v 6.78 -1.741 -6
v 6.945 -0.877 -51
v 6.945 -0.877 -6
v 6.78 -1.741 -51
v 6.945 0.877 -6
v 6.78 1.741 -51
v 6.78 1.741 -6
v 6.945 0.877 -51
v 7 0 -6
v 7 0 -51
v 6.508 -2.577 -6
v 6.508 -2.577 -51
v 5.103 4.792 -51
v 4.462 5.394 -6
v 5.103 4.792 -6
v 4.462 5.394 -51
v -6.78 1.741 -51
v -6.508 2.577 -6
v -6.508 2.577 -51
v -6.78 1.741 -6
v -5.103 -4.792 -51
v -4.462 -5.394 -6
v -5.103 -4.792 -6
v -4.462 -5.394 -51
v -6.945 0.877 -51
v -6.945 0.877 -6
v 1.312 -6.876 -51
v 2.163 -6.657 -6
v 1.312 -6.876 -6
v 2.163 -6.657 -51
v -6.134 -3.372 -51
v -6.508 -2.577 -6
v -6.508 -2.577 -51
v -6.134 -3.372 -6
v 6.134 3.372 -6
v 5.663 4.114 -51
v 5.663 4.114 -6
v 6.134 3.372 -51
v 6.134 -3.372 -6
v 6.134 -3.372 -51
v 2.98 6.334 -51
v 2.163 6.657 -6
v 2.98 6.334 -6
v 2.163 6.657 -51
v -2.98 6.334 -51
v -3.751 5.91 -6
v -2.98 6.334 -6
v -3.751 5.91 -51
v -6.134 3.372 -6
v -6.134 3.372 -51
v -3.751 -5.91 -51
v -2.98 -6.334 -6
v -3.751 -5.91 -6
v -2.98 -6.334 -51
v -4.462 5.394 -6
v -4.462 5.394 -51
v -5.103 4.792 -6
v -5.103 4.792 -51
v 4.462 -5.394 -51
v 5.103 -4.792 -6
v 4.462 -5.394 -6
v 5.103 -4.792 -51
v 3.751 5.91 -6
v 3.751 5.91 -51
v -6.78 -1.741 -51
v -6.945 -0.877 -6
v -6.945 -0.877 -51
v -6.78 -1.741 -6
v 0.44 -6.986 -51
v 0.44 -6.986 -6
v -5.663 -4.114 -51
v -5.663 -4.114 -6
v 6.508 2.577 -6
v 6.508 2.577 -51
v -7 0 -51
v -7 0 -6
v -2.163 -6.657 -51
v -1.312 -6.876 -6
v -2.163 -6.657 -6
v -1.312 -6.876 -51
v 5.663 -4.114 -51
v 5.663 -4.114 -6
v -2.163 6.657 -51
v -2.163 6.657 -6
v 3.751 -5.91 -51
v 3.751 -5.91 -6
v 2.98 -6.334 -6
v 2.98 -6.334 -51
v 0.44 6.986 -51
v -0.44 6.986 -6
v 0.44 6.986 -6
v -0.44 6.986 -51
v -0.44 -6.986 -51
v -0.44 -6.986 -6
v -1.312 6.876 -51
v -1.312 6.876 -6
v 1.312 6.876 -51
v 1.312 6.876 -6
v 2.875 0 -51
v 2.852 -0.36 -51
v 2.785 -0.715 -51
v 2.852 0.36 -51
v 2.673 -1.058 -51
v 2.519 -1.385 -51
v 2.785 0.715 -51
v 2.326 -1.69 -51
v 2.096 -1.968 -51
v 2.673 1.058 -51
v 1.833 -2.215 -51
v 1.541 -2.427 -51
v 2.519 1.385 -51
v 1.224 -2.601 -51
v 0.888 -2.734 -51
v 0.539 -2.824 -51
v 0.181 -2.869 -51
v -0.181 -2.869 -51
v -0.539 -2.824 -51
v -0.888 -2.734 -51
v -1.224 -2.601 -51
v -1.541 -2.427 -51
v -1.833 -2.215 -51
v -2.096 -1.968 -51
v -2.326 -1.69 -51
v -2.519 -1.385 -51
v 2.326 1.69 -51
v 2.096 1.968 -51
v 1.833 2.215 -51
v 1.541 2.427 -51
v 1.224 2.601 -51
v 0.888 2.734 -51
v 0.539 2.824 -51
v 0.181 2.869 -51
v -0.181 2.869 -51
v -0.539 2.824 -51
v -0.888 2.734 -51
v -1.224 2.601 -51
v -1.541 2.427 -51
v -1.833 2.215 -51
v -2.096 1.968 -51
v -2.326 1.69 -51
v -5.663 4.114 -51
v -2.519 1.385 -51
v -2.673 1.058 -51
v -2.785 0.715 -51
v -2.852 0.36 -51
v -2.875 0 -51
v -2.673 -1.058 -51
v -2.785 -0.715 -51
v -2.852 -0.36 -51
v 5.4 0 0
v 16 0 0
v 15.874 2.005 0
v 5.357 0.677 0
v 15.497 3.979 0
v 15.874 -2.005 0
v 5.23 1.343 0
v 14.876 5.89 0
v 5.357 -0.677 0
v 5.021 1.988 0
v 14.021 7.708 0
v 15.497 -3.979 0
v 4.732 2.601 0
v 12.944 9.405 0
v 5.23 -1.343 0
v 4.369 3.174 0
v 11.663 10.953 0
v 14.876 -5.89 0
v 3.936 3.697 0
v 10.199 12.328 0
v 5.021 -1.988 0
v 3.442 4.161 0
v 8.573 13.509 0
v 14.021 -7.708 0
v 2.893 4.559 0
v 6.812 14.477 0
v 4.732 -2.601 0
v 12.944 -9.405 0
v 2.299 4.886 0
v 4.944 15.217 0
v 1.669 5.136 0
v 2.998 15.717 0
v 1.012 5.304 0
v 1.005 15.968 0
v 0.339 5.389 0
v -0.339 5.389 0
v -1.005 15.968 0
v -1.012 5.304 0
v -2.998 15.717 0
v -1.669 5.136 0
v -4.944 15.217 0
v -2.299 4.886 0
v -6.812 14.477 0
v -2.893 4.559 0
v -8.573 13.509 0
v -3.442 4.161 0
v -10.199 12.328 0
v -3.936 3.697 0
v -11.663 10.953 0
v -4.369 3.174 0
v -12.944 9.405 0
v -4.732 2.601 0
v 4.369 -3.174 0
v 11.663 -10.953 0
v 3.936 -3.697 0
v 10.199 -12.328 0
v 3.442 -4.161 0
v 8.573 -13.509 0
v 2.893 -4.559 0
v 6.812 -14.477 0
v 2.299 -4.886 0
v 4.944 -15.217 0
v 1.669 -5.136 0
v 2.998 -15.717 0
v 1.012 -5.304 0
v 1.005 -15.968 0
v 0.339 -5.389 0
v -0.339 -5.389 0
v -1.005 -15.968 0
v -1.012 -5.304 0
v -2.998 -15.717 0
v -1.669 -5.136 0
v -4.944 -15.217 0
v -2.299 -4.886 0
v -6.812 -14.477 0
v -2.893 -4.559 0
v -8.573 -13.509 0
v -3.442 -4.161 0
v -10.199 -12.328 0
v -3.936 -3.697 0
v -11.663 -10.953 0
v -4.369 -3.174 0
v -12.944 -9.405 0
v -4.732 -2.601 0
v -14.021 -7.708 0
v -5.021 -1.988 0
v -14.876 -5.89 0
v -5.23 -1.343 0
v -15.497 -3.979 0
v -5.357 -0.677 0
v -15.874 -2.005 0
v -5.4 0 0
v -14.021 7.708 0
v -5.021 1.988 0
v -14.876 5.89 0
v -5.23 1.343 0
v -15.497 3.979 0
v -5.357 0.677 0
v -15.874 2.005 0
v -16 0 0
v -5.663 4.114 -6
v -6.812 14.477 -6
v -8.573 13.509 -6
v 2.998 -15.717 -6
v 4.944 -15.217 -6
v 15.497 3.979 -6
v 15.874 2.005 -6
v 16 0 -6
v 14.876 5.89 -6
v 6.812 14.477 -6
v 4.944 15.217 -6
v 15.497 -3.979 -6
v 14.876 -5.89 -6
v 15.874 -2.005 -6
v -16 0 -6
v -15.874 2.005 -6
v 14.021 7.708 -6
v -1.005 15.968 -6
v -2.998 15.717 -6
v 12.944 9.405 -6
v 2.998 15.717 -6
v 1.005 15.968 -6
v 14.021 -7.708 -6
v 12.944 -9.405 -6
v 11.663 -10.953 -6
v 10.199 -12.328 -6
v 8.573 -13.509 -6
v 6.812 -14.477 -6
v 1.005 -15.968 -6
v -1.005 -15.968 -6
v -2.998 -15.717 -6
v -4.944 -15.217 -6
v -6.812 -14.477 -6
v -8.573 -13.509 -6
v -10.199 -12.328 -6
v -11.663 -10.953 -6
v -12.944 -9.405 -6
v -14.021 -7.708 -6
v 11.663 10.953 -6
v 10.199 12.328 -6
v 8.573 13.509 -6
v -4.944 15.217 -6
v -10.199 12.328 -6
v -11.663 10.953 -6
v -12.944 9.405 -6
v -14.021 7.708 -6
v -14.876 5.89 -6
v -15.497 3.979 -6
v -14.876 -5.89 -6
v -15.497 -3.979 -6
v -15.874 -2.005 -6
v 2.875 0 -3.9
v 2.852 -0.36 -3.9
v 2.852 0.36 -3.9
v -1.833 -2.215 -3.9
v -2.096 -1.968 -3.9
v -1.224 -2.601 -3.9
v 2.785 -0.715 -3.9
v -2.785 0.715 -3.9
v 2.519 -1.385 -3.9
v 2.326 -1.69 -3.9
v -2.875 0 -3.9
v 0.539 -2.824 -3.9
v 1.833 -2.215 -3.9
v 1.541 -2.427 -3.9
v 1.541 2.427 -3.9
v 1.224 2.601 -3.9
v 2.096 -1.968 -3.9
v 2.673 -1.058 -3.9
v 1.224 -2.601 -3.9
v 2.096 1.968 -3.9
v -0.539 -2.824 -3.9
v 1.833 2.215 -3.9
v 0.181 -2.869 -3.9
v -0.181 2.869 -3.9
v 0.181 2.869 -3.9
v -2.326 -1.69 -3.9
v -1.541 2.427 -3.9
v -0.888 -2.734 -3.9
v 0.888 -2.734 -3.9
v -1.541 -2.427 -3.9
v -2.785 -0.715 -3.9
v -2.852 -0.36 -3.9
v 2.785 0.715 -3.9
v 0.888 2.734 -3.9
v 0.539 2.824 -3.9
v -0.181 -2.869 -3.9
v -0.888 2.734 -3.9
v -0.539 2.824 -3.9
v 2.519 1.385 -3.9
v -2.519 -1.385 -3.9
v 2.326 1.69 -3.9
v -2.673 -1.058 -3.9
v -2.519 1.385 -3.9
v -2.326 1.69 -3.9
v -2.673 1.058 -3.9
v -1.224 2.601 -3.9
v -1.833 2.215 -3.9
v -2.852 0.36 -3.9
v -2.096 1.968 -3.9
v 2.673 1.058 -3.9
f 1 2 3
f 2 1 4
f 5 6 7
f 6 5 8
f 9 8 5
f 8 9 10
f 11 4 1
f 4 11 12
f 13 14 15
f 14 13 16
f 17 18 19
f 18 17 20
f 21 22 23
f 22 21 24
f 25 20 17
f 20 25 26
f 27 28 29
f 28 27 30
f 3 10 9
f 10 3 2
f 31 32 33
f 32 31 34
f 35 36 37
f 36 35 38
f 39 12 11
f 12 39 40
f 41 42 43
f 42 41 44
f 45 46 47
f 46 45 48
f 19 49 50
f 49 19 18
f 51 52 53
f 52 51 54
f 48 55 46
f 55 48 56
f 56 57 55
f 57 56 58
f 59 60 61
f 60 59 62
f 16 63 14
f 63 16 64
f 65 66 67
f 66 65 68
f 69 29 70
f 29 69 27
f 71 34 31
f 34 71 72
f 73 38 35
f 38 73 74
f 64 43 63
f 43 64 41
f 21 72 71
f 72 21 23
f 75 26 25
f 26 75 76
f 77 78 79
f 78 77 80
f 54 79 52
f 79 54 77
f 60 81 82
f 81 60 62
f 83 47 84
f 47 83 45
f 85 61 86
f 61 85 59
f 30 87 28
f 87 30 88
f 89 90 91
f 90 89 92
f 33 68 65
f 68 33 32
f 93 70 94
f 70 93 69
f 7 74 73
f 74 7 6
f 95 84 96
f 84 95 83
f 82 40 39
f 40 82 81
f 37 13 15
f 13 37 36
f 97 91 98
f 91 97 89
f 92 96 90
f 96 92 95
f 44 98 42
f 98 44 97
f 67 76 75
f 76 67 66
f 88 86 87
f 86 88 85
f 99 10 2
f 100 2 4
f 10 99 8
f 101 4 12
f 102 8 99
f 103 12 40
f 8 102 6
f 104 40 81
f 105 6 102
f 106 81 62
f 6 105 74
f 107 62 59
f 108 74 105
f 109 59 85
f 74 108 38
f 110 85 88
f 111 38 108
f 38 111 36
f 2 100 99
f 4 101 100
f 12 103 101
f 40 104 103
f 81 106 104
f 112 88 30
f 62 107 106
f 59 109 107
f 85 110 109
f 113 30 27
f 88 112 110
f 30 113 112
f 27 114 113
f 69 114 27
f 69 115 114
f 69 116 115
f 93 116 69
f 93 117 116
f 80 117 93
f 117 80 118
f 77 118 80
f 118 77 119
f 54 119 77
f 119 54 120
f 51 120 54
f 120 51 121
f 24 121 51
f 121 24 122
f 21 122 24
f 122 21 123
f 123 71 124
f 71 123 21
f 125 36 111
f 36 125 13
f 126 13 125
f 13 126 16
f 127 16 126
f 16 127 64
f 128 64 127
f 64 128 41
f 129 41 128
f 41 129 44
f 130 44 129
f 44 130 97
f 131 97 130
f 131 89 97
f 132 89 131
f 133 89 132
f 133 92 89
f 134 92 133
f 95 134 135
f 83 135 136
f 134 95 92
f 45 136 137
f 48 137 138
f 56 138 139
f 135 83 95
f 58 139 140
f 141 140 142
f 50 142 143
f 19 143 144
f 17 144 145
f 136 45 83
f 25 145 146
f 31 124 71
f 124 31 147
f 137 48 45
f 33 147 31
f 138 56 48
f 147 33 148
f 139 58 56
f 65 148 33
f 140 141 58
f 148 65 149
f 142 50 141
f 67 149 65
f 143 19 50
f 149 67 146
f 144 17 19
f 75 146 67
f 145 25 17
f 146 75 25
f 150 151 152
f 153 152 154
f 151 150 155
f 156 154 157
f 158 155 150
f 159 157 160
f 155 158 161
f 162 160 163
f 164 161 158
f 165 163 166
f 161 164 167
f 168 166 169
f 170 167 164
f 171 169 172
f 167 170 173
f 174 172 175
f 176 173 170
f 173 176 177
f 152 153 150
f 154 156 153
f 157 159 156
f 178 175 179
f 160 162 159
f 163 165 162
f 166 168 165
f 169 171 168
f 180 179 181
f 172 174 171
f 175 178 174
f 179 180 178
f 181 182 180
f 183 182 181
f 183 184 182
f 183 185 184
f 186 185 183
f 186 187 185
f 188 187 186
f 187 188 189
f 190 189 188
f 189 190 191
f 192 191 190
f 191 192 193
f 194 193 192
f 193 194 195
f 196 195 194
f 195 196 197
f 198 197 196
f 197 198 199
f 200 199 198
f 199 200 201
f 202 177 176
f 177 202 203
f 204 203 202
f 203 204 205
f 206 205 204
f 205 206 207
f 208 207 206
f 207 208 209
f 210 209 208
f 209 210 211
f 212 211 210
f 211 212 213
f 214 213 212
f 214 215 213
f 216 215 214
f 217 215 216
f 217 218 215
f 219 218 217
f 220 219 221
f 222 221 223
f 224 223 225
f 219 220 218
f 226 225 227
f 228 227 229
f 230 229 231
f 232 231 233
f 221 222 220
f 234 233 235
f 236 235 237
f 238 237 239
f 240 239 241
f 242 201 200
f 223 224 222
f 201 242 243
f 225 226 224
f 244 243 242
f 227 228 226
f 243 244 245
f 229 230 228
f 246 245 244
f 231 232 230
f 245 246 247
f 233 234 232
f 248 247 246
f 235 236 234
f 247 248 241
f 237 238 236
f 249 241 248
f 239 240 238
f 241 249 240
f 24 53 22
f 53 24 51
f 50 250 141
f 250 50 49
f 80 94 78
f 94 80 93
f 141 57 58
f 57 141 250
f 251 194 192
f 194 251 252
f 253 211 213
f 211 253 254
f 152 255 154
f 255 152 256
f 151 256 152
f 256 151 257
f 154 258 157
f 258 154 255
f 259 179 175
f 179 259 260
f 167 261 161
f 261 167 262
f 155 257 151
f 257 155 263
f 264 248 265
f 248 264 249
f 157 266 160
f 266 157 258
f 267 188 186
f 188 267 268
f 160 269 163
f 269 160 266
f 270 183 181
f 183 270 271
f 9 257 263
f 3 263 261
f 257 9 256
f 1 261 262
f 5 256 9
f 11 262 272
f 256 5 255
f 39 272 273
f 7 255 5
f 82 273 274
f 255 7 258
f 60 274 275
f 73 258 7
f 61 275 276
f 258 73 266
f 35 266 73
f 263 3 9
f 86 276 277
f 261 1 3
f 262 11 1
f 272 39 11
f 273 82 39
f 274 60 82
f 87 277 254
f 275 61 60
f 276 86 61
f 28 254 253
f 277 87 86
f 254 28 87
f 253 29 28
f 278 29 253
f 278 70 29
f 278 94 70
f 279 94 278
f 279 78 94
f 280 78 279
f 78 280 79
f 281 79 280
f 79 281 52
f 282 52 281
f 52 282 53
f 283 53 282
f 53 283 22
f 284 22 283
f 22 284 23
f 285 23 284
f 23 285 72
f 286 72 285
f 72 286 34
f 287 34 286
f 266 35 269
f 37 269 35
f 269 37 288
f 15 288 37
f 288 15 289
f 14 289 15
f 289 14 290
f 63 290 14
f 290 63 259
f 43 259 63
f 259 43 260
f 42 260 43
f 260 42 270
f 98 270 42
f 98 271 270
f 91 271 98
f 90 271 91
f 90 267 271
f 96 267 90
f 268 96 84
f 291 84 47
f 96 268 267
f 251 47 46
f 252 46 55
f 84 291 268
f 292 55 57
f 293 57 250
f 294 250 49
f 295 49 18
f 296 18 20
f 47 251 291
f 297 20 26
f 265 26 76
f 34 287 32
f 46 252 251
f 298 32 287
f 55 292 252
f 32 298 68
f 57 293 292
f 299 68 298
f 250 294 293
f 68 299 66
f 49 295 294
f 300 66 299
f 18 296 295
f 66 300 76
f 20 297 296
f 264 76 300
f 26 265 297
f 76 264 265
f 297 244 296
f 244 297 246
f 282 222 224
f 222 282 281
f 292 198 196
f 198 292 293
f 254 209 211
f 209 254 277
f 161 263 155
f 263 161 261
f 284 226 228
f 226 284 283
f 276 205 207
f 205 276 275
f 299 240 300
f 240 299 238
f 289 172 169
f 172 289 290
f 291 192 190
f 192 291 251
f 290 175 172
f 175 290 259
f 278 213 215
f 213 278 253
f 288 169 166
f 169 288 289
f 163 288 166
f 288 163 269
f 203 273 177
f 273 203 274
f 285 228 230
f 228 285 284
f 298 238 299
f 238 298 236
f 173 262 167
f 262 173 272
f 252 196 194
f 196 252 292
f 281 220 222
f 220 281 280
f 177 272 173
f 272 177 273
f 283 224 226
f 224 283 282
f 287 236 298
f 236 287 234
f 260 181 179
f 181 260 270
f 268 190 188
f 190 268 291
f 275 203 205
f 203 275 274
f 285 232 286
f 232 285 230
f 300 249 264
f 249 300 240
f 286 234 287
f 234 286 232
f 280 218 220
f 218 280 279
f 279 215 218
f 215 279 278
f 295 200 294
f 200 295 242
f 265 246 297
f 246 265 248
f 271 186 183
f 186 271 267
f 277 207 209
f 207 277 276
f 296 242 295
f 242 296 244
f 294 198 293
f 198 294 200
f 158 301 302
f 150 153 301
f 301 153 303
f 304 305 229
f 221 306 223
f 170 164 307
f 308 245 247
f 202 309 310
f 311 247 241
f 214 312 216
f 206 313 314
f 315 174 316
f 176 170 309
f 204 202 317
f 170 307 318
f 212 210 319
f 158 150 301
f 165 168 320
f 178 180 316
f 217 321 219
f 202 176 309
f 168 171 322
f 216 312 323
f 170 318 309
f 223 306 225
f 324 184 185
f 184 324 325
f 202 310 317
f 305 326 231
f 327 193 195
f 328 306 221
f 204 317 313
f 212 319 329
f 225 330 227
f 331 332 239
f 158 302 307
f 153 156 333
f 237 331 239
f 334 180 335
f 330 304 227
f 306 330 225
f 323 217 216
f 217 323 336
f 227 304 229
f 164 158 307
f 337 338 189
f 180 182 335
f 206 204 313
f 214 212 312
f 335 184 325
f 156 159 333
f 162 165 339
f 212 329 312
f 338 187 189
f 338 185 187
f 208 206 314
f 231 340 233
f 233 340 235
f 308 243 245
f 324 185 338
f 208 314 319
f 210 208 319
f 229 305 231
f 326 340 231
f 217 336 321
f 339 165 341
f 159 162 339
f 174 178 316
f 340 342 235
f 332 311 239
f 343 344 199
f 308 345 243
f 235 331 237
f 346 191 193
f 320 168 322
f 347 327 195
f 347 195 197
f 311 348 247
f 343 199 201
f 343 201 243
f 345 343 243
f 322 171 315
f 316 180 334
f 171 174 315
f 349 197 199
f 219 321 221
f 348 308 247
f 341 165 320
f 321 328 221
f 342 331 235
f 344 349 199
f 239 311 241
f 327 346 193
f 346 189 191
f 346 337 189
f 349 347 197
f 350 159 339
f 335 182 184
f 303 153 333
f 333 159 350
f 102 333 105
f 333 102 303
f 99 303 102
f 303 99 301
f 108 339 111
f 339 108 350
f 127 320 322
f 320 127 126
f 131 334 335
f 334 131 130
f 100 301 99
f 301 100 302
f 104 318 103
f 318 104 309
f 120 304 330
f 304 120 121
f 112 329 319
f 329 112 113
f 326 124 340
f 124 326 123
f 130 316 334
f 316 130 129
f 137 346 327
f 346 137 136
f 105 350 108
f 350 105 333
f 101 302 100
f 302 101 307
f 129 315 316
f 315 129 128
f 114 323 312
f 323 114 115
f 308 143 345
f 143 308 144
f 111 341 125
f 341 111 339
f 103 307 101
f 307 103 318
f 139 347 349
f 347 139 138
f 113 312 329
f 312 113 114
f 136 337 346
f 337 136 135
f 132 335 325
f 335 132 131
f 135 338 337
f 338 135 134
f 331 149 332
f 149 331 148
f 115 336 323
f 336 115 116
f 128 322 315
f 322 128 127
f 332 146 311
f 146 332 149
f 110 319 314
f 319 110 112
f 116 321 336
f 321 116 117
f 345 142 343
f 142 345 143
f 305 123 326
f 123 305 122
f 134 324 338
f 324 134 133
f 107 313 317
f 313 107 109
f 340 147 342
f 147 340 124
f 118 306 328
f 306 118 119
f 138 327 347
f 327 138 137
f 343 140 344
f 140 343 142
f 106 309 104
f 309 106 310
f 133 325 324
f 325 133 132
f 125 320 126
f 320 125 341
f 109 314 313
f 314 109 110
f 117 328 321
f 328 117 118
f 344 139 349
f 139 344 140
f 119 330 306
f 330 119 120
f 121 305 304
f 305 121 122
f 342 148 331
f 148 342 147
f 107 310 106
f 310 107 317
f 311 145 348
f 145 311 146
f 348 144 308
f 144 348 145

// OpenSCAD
$fn = 50;


difference() {
	union() {
		translate(v = [0, 0, -51.0000000000]) {
			cylinder(h = 51, r = 7.0000000000);
		}
		translate(v = [0, 0, -6.0000000000]) {
			cylinder(h = 6, r = 16.0000000000);
		}
	}
	union() {
		translate(v = [0, 0, 0]) {
			rotate(a = [0, 0, 0]) {
				difference() {
					union() {
						#translate(v = [0, 0, -51.0000000000]) {
							cylinder(h = 51, r = 2.6000000000);
						}
						#translate(v = [0, 0, -3.9000000000]) {
							cylinder(h = 3.9000000000, r1 = 2.8750000000, r2 = 5.4000000000);
						}
						#translate(v = [0, 0, -51.0000000000]) {
							cylinder(h = 51, r = 2.8750000000);
						}
						#translate(v = [0, 0, -51.0000000000]) {
							cylinder(h = 51, r = 2.6000000000);
						}
					}
					union();
				}
			}
		}
	}
}
